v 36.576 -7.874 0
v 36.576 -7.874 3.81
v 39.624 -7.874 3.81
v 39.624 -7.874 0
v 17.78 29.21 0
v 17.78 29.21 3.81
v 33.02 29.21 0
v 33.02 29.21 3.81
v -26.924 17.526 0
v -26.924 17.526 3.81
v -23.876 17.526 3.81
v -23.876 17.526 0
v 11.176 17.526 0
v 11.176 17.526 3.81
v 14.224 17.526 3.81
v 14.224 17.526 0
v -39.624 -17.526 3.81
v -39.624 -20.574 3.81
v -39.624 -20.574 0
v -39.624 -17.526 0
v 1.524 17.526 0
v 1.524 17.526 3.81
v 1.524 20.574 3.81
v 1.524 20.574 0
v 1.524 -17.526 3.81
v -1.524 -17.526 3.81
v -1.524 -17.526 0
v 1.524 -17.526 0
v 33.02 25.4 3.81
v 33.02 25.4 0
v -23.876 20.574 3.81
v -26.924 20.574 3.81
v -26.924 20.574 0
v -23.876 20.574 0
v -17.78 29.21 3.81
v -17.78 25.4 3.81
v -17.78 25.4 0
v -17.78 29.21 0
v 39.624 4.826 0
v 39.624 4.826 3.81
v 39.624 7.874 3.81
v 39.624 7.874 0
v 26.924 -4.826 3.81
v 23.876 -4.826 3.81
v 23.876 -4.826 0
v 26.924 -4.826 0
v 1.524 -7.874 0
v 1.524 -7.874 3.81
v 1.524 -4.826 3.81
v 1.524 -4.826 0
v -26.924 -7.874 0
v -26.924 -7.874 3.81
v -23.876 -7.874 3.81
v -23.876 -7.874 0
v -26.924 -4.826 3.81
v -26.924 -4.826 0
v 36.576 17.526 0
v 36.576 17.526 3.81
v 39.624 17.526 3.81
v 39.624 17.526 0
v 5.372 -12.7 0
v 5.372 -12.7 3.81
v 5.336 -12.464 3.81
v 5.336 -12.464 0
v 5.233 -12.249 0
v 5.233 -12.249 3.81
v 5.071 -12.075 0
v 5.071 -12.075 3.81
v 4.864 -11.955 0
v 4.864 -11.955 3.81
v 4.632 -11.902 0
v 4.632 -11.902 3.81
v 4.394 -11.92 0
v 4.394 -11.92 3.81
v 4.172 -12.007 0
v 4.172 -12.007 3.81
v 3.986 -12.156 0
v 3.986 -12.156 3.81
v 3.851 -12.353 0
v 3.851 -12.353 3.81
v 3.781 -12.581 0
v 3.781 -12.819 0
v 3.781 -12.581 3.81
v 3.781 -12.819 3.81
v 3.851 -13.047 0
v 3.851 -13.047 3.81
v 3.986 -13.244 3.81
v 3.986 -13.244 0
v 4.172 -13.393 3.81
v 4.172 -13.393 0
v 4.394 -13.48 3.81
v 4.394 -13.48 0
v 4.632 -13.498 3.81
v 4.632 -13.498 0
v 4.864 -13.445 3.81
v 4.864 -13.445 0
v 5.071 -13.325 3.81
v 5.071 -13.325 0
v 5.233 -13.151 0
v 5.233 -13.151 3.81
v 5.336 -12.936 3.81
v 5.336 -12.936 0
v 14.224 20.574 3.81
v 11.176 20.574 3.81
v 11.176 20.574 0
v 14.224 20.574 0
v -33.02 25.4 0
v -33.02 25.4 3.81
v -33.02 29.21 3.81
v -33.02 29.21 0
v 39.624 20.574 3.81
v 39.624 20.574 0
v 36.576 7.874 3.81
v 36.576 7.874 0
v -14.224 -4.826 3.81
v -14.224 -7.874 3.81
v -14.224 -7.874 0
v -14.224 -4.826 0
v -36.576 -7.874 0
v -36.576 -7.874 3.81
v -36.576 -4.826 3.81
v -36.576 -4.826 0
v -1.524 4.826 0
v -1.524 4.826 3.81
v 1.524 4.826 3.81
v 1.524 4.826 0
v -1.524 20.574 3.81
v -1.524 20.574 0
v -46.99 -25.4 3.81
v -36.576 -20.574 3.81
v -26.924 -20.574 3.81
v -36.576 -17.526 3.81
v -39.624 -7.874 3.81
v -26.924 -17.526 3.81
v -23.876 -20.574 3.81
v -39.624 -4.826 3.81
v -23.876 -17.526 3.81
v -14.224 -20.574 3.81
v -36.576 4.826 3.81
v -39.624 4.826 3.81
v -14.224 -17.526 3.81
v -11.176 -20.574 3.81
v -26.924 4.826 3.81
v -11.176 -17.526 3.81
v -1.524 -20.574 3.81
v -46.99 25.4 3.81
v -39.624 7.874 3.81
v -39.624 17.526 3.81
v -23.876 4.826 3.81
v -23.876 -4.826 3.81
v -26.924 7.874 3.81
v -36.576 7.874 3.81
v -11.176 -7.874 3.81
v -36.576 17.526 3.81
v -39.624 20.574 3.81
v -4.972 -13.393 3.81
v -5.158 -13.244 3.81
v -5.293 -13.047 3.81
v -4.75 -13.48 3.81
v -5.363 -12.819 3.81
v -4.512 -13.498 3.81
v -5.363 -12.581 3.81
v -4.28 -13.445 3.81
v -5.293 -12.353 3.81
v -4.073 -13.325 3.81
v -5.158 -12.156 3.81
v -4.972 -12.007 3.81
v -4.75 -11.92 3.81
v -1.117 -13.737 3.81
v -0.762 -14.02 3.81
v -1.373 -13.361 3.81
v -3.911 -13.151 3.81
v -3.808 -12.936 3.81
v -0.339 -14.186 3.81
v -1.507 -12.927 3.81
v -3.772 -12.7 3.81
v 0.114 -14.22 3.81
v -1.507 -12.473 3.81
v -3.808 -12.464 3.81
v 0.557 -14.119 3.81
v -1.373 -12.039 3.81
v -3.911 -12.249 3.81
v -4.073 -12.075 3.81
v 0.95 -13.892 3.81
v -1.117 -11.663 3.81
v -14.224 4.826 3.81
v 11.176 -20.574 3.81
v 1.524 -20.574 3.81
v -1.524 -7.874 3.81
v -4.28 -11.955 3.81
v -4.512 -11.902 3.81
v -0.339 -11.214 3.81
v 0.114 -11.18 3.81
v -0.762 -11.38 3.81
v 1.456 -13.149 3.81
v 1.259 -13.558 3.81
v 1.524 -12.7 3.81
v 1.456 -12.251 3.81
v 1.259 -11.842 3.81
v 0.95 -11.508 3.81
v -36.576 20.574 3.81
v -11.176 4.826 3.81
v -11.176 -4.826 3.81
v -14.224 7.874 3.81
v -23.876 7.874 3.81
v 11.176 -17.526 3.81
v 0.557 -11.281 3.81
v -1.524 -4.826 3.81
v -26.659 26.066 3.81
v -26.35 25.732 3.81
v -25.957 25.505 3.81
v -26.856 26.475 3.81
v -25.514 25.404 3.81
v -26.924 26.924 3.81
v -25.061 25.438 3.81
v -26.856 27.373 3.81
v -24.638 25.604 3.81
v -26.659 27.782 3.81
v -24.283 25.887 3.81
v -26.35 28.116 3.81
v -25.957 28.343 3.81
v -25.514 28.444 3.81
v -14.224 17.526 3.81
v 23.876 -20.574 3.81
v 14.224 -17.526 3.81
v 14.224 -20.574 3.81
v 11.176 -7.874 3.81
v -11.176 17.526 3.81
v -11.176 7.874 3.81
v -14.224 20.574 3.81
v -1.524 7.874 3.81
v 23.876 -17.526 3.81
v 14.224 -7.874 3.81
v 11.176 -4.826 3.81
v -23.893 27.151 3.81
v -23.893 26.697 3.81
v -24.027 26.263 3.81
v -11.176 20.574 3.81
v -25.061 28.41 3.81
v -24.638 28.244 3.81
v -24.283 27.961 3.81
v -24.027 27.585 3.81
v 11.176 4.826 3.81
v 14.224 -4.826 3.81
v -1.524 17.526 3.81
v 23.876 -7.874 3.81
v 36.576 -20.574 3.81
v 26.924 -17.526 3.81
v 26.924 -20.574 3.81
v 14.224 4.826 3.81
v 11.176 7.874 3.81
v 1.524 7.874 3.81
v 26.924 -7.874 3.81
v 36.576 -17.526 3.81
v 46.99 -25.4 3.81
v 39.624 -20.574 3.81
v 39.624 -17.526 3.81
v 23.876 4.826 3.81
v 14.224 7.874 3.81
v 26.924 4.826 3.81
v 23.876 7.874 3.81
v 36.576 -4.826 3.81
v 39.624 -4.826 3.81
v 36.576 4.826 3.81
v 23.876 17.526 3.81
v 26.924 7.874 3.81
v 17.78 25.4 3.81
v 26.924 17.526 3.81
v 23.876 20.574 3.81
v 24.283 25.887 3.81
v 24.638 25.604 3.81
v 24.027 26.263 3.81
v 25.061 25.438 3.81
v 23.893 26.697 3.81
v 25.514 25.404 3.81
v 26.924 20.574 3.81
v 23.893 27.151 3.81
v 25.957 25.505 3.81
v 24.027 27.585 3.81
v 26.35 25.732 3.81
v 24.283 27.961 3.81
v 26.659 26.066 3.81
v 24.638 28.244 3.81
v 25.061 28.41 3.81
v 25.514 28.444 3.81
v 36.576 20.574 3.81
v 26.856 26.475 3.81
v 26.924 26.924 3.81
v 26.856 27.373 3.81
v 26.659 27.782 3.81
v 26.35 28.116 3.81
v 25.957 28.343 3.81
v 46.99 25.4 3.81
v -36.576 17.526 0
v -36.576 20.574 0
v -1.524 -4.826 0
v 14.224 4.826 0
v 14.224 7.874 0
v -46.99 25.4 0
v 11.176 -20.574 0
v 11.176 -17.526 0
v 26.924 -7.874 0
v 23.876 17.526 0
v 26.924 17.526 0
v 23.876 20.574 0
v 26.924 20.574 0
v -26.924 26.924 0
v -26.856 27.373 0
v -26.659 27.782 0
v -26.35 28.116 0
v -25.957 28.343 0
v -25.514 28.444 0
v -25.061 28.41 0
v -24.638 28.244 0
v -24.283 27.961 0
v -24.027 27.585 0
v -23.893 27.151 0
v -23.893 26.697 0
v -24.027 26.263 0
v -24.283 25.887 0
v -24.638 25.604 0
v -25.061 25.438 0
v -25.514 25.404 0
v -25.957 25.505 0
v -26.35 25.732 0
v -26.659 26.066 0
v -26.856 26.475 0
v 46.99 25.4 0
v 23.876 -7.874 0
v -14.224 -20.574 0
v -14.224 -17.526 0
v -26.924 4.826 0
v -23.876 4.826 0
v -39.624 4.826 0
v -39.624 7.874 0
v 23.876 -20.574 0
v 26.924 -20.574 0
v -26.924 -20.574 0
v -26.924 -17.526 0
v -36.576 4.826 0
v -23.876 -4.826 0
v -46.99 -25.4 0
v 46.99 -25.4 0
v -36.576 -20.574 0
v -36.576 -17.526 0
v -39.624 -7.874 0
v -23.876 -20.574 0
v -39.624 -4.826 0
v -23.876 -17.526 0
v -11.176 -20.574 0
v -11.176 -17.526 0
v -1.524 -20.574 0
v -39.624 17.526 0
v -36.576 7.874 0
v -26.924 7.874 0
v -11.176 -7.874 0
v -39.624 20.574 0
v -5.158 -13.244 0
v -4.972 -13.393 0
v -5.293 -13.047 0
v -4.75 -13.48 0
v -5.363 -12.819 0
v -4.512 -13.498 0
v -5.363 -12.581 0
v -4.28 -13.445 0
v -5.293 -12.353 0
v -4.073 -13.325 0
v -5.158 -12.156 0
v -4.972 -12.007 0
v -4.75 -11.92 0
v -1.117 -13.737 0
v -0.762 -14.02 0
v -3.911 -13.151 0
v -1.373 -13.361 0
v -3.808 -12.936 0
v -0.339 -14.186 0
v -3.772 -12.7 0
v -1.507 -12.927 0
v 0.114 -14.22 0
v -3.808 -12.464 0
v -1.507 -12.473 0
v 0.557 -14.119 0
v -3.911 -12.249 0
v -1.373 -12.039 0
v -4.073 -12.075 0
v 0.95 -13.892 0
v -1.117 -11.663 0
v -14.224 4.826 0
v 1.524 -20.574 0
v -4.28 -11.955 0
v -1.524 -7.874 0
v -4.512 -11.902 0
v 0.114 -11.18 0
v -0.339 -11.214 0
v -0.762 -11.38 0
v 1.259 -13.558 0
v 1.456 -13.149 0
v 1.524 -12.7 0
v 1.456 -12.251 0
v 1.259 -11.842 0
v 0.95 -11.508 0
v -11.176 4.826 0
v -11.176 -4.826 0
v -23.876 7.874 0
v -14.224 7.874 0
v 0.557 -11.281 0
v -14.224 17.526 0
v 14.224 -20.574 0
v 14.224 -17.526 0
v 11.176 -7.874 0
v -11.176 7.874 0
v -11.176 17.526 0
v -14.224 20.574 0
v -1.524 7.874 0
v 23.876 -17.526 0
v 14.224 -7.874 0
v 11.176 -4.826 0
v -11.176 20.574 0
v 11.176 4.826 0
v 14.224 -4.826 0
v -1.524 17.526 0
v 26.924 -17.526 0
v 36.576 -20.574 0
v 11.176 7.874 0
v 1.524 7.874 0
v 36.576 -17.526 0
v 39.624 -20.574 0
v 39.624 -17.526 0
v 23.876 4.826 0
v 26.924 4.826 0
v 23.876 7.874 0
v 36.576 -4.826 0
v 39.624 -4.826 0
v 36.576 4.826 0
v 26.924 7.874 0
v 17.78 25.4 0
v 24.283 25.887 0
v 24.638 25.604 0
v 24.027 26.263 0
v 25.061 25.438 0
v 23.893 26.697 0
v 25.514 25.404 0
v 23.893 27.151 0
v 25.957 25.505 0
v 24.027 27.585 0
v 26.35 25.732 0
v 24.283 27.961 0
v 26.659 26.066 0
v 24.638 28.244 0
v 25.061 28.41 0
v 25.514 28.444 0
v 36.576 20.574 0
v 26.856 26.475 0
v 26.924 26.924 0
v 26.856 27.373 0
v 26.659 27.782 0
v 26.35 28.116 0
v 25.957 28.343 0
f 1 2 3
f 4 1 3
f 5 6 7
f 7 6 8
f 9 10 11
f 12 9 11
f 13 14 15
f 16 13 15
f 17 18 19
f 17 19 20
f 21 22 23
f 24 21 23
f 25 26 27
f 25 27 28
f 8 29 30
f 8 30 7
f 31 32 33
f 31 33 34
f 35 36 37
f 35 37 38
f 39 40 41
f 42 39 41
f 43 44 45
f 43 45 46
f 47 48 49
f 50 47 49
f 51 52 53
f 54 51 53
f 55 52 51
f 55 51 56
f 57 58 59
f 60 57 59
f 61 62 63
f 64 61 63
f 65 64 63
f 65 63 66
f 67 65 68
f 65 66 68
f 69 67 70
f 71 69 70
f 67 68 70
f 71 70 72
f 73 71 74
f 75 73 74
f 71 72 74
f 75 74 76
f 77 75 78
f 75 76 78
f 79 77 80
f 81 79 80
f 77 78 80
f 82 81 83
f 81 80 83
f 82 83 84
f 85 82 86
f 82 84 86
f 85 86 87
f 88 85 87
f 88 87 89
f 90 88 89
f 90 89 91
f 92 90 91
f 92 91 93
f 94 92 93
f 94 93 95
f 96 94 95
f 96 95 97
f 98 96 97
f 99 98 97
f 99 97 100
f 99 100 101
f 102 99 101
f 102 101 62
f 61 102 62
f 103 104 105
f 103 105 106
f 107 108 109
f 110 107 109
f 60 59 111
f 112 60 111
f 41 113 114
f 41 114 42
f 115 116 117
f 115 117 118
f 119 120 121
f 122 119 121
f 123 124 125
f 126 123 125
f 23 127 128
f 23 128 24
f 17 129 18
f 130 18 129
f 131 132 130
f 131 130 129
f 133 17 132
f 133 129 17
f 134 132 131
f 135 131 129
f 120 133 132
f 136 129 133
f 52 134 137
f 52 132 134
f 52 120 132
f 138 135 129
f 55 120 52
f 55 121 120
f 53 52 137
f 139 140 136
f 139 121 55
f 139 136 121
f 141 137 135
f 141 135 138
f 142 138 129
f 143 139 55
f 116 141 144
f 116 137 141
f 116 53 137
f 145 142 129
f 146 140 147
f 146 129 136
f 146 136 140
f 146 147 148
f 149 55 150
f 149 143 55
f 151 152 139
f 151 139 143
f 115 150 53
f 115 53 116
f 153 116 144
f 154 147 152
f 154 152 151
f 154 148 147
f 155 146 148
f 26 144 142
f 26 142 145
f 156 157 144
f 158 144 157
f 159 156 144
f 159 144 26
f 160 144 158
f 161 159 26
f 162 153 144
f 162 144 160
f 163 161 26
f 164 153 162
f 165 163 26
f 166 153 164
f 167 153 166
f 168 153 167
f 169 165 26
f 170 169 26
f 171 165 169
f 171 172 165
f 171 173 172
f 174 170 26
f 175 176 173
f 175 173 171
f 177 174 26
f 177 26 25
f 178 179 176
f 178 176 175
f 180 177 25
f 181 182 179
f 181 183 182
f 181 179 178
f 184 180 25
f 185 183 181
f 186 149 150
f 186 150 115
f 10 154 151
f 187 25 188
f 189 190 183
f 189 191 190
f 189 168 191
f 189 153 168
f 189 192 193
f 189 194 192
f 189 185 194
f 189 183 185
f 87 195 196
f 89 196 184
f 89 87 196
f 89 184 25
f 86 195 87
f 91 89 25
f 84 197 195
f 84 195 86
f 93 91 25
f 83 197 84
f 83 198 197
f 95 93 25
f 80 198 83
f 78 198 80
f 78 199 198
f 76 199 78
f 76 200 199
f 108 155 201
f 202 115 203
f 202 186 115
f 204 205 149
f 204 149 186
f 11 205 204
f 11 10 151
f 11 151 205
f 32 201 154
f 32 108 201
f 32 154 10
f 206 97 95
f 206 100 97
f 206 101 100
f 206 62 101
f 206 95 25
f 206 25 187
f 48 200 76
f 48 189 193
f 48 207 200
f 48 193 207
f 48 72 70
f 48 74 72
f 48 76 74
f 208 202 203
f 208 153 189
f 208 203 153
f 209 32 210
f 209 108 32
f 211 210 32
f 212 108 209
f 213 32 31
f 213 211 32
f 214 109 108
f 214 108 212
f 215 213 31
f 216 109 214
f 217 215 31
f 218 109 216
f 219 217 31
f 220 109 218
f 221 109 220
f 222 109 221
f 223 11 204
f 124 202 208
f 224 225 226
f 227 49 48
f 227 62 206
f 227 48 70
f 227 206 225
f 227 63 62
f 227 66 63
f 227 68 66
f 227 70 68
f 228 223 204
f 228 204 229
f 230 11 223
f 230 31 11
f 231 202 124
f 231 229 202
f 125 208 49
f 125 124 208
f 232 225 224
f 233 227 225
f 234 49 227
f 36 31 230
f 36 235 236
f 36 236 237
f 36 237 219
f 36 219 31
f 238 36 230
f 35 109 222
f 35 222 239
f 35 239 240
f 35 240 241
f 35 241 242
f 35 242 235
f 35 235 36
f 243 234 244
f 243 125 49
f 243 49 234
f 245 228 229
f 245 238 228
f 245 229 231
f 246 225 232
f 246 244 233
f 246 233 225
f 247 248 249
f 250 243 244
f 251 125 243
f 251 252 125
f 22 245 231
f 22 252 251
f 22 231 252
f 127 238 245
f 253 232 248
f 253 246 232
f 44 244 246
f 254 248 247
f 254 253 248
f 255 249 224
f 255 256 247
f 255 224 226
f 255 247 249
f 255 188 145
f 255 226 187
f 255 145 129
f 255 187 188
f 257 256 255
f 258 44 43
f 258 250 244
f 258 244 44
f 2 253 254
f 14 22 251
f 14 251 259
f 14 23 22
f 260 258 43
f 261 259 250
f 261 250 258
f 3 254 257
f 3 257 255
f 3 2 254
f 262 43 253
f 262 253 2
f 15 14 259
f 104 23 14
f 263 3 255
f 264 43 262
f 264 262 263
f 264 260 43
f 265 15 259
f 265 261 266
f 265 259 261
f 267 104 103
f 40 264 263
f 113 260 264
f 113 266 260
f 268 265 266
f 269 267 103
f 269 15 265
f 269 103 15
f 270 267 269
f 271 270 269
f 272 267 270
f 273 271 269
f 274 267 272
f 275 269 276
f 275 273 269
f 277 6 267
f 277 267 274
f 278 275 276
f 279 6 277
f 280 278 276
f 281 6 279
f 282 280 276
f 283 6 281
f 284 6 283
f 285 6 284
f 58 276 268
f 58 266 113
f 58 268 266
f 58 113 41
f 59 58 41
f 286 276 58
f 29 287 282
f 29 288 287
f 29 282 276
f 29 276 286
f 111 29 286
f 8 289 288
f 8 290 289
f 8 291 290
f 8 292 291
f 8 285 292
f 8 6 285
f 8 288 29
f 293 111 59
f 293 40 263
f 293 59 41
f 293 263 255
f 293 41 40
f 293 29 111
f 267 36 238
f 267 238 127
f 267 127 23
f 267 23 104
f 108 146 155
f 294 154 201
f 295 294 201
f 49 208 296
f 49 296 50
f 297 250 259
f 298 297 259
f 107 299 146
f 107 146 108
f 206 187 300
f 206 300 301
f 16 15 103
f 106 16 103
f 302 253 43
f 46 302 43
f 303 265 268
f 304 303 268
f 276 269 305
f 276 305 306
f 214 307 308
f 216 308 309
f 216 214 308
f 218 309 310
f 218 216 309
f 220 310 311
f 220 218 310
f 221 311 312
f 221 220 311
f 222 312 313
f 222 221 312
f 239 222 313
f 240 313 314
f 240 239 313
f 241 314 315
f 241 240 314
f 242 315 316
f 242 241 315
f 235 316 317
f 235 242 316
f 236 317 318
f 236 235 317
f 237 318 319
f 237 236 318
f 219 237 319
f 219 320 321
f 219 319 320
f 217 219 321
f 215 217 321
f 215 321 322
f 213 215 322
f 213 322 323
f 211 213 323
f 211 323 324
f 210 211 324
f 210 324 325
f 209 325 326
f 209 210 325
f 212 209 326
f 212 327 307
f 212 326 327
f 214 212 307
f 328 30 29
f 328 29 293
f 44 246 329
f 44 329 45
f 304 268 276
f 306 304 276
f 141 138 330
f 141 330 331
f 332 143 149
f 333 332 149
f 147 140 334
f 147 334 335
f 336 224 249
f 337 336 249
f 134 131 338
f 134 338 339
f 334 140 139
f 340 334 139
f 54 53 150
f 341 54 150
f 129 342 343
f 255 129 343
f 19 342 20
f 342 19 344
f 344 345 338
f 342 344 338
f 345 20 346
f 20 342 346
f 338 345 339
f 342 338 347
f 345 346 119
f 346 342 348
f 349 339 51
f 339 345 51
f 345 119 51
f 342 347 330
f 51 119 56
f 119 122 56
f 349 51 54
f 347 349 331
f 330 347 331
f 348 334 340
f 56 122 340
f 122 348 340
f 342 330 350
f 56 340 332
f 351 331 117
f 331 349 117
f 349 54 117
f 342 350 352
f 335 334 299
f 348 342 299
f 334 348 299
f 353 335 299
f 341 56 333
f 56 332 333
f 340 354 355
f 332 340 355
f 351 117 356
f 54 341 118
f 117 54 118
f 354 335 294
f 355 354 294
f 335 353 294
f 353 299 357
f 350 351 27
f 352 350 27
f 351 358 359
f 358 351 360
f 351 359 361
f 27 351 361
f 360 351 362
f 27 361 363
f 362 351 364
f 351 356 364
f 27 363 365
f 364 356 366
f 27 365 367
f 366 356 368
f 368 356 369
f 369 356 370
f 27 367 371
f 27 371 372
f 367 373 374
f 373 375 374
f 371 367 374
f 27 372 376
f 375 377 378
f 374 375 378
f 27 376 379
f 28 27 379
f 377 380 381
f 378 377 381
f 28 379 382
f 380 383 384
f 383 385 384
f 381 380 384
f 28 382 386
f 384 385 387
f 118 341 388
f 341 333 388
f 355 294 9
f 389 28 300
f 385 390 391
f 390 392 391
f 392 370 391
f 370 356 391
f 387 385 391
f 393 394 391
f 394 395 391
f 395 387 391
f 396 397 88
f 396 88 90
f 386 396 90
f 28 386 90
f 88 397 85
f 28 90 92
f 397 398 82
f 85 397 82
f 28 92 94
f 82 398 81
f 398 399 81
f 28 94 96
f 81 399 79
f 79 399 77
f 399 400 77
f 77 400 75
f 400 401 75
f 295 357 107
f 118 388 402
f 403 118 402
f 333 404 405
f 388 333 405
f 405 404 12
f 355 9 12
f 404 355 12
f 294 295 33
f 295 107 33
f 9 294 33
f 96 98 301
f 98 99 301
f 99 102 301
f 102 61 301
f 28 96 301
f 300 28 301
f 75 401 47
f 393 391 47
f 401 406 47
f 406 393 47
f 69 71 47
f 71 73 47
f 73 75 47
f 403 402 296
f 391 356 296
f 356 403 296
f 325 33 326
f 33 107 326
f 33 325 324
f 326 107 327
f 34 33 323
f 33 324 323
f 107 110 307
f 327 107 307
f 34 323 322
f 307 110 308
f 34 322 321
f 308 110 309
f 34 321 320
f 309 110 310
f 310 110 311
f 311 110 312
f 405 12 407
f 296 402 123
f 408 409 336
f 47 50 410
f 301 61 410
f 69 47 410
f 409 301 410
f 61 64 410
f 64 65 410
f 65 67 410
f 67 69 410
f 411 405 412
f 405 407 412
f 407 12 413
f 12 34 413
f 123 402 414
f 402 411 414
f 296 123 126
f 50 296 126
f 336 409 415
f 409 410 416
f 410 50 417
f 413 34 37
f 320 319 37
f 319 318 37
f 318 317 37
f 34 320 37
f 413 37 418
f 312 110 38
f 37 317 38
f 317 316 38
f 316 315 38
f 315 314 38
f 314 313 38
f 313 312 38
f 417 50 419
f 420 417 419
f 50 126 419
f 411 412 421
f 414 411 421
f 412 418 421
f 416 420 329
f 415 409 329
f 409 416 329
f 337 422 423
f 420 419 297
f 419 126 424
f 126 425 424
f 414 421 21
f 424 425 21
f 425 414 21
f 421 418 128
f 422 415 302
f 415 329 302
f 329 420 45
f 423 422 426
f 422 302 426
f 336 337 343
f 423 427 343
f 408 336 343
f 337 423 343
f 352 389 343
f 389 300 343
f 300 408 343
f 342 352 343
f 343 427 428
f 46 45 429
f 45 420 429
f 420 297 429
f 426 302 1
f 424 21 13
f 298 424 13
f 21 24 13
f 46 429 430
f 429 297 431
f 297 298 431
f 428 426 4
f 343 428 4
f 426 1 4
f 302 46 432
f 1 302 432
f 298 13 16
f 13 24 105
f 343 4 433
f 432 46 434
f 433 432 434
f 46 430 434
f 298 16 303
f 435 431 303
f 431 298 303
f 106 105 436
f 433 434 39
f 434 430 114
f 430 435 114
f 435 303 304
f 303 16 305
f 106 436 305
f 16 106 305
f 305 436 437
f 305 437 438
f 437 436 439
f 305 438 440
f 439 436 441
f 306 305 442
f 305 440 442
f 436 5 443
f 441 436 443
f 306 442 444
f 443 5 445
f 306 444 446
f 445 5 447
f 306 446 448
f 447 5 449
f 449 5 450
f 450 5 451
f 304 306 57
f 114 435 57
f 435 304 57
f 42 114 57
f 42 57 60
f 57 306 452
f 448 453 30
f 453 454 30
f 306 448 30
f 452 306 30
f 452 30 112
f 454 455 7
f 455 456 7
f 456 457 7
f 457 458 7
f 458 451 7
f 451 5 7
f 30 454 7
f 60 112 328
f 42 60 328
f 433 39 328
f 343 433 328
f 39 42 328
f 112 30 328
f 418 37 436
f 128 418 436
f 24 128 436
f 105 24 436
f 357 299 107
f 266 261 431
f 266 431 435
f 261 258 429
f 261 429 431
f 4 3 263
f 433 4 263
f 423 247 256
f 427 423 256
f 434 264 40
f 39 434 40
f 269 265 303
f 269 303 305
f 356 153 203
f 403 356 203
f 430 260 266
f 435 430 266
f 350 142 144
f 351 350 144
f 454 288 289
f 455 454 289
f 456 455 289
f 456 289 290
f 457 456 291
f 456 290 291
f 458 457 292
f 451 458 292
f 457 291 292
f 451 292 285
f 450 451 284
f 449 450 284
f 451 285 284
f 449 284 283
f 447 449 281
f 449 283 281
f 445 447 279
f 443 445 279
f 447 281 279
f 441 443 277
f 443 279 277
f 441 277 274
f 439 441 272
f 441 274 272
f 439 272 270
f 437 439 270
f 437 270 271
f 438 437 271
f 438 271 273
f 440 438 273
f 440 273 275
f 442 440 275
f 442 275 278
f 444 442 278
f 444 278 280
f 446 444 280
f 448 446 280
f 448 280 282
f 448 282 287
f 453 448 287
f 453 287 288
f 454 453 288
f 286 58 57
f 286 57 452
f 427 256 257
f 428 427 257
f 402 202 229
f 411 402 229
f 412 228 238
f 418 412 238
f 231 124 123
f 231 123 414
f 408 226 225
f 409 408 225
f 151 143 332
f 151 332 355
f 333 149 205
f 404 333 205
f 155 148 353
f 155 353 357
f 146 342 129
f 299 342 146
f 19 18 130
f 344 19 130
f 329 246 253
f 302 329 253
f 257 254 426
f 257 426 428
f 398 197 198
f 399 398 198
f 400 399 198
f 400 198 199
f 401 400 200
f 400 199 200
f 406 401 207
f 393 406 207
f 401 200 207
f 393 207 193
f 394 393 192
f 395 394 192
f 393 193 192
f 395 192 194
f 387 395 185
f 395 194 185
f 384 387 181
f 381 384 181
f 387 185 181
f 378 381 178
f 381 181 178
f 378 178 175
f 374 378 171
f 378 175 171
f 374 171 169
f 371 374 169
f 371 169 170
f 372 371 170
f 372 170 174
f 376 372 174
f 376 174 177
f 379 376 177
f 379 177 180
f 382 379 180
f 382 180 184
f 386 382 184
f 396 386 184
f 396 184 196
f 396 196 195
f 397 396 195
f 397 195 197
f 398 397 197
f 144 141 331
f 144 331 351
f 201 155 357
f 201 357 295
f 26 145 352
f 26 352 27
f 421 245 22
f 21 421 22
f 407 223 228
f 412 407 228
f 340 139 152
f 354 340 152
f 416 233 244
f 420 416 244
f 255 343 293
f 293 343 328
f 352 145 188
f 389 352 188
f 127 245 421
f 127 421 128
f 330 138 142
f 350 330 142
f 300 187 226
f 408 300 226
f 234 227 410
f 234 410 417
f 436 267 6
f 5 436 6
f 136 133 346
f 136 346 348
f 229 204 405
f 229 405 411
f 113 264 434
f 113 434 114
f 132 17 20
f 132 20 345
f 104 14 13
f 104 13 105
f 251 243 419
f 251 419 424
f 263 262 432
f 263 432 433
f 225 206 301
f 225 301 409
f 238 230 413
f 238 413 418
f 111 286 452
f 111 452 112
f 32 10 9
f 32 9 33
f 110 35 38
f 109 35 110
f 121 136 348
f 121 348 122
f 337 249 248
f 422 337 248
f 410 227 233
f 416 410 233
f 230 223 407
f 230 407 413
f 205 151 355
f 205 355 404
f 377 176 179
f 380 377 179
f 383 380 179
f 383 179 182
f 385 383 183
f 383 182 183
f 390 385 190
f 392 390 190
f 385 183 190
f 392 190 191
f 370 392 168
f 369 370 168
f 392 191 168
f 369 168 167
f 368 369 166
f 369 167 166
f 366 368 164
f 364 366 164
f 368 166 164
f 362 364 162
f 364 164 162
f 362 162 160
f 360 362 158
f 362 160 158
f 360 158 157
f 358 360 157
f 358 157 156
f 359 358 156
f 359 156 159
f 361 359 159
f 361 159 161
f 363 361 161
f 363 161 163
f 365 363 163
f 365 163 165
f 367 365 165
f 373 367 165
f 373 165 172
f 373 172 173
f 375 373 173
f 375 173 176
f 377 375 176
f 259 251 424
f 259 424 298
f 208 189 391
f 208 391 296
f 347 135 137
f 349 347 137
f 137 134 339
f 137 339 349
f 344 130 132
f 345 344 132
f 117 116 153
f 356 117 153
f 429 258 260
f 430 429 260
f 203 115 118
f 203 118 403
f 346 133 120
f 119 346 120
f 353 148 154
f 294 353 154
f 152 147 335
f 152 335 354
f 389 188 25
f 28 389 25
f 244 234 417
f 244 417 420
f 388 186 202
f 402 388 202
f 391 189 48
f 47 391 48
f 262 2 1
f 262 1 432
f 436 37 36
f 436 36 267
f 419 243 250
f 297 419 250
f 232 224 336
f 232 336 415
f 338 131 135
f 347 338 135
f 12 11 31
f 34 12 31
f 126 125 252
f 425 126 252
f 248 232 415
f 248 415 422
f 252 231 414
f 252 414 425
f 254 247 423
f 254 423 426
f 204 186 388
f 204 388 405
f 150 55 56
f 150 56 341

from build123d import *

# Parameters (mm, degrees)
SKETCH1_W            = 93.98
SKETCH1_H            = 50.8
BOSS_EXTRUDE4_DEPTH  = 3.81
SKETCH26_W           = 3.048
SKETCH26_H           = 3.048
CUT_EXTRUDE30_DEPTH  = 54.551248351
LPATTERN9_COUNT      = 4
LPATTERN9_PITCH      = 12.7
LPATTERN9_COUNT_DIR2 = 7
LPATTERN9_PITCH_DIR2 = 12.7
SKETCH25_R           = 1.524
SKETCH25_R_2         = 0.8
CUT_EXTRUDE29_DEPTH  = 54.551248351
SKETCH27_W           = 15.24
SKETCH27_H           = 3.81
BOSS_EXTRUDE5_DEPTH  = 3.81
SKETCH28_R           = 1.524
CUT_EXTRUDE31_DEPTH  = 56.459898125


with BuildPart() as part:
    # Sketch1 → Boss-Extrude4 (new body)
    with BuildSketch(Plane.XY):
        Rectangle(SKETCH1_W, SKETCH1_H)
    extrude(amount=BOSS_EXTRUDE4_DEPTH)

    # Sketch26 → Cut-Extrude30 (cut, through all)
    with BuildSketch(Plane.XY.offset(3.81)):
        with Locations((38.1, 19.05)):
            Rectangle(SKETCH26_W, SKETCH26_H)
    cut_extrude30 = extrude(amount=-CUT_EXTRUDE30_DEPTH, mode=Mode.SUBTRACT)

    # LPattern9: Cut-Extrude30 4 × 7
    with Locations(*[(-j * LPATTERN9_PITCH_DIR2, -i * LPATTERN9_PITCH, 0) for i in range(LPATTERN9_COUNT) for j in range(LPATTERN9_COUNT_DIR2) if (i, j) != (0, 0)]):
        add(cut_extrude30, mode=Mode.SUBTRACT)

    # Sketch25 → Cut-Extrude29 (cut, through all)
    with BuildSketch(Plane.XY.offset(3.81)):
        with Locations((0, -12.7)):
            Circle(SKETCH25_R)
        with Locations((-4.572, -12.7)):
            Circle(SKETCH25_R_2)
        with Locations((4.572, -12.7)):
            Circle(SKETCH25_R_2)
    extrude(amount=-CUT_EXTRUDE29_DEPTH, mode=Mode.SUBTRACT)

    # Sketch27 → Boss-Extrude5 (add)
    with BuildSketch(Plane.XY.offset(3.81)):
        with Locations((25.4, 27.305)):
            Rectangle(SKETCH27_W, SKETCH27_H)
    boss_extrude5 = extrude(amount=-BOSS_EXTRUDE5_DEPTH)

    # Sketch28 → Cut-Extrude31 (cut, through all)
    with BuildSketch(Plane.XY.offset(3.81)):
        with Locations((25.4, 26.924)):
            Circle(SKETCH28_R)
    cut_extrude31 = extrude(amount=-CUT_EXTRUDE31_DEPTH, mode=Mode.SUBTRACT)

    # Mirror1: Boss-Extrude5, Cut-Extrude31 across plane
    add(boss_extrude5.mirror(Plane(origin=(0, 0, 0), x_dir=(0, 0, 1), z_dir=(1, 0, 0))))
    add(cut_extrude31.mirror(Plane(origin=(0, 0, 0), x_dir=(0, 0, 1), z_dir=(1, 0, 0))), mode=Mode.SUBTRACT)


solid = part.part
